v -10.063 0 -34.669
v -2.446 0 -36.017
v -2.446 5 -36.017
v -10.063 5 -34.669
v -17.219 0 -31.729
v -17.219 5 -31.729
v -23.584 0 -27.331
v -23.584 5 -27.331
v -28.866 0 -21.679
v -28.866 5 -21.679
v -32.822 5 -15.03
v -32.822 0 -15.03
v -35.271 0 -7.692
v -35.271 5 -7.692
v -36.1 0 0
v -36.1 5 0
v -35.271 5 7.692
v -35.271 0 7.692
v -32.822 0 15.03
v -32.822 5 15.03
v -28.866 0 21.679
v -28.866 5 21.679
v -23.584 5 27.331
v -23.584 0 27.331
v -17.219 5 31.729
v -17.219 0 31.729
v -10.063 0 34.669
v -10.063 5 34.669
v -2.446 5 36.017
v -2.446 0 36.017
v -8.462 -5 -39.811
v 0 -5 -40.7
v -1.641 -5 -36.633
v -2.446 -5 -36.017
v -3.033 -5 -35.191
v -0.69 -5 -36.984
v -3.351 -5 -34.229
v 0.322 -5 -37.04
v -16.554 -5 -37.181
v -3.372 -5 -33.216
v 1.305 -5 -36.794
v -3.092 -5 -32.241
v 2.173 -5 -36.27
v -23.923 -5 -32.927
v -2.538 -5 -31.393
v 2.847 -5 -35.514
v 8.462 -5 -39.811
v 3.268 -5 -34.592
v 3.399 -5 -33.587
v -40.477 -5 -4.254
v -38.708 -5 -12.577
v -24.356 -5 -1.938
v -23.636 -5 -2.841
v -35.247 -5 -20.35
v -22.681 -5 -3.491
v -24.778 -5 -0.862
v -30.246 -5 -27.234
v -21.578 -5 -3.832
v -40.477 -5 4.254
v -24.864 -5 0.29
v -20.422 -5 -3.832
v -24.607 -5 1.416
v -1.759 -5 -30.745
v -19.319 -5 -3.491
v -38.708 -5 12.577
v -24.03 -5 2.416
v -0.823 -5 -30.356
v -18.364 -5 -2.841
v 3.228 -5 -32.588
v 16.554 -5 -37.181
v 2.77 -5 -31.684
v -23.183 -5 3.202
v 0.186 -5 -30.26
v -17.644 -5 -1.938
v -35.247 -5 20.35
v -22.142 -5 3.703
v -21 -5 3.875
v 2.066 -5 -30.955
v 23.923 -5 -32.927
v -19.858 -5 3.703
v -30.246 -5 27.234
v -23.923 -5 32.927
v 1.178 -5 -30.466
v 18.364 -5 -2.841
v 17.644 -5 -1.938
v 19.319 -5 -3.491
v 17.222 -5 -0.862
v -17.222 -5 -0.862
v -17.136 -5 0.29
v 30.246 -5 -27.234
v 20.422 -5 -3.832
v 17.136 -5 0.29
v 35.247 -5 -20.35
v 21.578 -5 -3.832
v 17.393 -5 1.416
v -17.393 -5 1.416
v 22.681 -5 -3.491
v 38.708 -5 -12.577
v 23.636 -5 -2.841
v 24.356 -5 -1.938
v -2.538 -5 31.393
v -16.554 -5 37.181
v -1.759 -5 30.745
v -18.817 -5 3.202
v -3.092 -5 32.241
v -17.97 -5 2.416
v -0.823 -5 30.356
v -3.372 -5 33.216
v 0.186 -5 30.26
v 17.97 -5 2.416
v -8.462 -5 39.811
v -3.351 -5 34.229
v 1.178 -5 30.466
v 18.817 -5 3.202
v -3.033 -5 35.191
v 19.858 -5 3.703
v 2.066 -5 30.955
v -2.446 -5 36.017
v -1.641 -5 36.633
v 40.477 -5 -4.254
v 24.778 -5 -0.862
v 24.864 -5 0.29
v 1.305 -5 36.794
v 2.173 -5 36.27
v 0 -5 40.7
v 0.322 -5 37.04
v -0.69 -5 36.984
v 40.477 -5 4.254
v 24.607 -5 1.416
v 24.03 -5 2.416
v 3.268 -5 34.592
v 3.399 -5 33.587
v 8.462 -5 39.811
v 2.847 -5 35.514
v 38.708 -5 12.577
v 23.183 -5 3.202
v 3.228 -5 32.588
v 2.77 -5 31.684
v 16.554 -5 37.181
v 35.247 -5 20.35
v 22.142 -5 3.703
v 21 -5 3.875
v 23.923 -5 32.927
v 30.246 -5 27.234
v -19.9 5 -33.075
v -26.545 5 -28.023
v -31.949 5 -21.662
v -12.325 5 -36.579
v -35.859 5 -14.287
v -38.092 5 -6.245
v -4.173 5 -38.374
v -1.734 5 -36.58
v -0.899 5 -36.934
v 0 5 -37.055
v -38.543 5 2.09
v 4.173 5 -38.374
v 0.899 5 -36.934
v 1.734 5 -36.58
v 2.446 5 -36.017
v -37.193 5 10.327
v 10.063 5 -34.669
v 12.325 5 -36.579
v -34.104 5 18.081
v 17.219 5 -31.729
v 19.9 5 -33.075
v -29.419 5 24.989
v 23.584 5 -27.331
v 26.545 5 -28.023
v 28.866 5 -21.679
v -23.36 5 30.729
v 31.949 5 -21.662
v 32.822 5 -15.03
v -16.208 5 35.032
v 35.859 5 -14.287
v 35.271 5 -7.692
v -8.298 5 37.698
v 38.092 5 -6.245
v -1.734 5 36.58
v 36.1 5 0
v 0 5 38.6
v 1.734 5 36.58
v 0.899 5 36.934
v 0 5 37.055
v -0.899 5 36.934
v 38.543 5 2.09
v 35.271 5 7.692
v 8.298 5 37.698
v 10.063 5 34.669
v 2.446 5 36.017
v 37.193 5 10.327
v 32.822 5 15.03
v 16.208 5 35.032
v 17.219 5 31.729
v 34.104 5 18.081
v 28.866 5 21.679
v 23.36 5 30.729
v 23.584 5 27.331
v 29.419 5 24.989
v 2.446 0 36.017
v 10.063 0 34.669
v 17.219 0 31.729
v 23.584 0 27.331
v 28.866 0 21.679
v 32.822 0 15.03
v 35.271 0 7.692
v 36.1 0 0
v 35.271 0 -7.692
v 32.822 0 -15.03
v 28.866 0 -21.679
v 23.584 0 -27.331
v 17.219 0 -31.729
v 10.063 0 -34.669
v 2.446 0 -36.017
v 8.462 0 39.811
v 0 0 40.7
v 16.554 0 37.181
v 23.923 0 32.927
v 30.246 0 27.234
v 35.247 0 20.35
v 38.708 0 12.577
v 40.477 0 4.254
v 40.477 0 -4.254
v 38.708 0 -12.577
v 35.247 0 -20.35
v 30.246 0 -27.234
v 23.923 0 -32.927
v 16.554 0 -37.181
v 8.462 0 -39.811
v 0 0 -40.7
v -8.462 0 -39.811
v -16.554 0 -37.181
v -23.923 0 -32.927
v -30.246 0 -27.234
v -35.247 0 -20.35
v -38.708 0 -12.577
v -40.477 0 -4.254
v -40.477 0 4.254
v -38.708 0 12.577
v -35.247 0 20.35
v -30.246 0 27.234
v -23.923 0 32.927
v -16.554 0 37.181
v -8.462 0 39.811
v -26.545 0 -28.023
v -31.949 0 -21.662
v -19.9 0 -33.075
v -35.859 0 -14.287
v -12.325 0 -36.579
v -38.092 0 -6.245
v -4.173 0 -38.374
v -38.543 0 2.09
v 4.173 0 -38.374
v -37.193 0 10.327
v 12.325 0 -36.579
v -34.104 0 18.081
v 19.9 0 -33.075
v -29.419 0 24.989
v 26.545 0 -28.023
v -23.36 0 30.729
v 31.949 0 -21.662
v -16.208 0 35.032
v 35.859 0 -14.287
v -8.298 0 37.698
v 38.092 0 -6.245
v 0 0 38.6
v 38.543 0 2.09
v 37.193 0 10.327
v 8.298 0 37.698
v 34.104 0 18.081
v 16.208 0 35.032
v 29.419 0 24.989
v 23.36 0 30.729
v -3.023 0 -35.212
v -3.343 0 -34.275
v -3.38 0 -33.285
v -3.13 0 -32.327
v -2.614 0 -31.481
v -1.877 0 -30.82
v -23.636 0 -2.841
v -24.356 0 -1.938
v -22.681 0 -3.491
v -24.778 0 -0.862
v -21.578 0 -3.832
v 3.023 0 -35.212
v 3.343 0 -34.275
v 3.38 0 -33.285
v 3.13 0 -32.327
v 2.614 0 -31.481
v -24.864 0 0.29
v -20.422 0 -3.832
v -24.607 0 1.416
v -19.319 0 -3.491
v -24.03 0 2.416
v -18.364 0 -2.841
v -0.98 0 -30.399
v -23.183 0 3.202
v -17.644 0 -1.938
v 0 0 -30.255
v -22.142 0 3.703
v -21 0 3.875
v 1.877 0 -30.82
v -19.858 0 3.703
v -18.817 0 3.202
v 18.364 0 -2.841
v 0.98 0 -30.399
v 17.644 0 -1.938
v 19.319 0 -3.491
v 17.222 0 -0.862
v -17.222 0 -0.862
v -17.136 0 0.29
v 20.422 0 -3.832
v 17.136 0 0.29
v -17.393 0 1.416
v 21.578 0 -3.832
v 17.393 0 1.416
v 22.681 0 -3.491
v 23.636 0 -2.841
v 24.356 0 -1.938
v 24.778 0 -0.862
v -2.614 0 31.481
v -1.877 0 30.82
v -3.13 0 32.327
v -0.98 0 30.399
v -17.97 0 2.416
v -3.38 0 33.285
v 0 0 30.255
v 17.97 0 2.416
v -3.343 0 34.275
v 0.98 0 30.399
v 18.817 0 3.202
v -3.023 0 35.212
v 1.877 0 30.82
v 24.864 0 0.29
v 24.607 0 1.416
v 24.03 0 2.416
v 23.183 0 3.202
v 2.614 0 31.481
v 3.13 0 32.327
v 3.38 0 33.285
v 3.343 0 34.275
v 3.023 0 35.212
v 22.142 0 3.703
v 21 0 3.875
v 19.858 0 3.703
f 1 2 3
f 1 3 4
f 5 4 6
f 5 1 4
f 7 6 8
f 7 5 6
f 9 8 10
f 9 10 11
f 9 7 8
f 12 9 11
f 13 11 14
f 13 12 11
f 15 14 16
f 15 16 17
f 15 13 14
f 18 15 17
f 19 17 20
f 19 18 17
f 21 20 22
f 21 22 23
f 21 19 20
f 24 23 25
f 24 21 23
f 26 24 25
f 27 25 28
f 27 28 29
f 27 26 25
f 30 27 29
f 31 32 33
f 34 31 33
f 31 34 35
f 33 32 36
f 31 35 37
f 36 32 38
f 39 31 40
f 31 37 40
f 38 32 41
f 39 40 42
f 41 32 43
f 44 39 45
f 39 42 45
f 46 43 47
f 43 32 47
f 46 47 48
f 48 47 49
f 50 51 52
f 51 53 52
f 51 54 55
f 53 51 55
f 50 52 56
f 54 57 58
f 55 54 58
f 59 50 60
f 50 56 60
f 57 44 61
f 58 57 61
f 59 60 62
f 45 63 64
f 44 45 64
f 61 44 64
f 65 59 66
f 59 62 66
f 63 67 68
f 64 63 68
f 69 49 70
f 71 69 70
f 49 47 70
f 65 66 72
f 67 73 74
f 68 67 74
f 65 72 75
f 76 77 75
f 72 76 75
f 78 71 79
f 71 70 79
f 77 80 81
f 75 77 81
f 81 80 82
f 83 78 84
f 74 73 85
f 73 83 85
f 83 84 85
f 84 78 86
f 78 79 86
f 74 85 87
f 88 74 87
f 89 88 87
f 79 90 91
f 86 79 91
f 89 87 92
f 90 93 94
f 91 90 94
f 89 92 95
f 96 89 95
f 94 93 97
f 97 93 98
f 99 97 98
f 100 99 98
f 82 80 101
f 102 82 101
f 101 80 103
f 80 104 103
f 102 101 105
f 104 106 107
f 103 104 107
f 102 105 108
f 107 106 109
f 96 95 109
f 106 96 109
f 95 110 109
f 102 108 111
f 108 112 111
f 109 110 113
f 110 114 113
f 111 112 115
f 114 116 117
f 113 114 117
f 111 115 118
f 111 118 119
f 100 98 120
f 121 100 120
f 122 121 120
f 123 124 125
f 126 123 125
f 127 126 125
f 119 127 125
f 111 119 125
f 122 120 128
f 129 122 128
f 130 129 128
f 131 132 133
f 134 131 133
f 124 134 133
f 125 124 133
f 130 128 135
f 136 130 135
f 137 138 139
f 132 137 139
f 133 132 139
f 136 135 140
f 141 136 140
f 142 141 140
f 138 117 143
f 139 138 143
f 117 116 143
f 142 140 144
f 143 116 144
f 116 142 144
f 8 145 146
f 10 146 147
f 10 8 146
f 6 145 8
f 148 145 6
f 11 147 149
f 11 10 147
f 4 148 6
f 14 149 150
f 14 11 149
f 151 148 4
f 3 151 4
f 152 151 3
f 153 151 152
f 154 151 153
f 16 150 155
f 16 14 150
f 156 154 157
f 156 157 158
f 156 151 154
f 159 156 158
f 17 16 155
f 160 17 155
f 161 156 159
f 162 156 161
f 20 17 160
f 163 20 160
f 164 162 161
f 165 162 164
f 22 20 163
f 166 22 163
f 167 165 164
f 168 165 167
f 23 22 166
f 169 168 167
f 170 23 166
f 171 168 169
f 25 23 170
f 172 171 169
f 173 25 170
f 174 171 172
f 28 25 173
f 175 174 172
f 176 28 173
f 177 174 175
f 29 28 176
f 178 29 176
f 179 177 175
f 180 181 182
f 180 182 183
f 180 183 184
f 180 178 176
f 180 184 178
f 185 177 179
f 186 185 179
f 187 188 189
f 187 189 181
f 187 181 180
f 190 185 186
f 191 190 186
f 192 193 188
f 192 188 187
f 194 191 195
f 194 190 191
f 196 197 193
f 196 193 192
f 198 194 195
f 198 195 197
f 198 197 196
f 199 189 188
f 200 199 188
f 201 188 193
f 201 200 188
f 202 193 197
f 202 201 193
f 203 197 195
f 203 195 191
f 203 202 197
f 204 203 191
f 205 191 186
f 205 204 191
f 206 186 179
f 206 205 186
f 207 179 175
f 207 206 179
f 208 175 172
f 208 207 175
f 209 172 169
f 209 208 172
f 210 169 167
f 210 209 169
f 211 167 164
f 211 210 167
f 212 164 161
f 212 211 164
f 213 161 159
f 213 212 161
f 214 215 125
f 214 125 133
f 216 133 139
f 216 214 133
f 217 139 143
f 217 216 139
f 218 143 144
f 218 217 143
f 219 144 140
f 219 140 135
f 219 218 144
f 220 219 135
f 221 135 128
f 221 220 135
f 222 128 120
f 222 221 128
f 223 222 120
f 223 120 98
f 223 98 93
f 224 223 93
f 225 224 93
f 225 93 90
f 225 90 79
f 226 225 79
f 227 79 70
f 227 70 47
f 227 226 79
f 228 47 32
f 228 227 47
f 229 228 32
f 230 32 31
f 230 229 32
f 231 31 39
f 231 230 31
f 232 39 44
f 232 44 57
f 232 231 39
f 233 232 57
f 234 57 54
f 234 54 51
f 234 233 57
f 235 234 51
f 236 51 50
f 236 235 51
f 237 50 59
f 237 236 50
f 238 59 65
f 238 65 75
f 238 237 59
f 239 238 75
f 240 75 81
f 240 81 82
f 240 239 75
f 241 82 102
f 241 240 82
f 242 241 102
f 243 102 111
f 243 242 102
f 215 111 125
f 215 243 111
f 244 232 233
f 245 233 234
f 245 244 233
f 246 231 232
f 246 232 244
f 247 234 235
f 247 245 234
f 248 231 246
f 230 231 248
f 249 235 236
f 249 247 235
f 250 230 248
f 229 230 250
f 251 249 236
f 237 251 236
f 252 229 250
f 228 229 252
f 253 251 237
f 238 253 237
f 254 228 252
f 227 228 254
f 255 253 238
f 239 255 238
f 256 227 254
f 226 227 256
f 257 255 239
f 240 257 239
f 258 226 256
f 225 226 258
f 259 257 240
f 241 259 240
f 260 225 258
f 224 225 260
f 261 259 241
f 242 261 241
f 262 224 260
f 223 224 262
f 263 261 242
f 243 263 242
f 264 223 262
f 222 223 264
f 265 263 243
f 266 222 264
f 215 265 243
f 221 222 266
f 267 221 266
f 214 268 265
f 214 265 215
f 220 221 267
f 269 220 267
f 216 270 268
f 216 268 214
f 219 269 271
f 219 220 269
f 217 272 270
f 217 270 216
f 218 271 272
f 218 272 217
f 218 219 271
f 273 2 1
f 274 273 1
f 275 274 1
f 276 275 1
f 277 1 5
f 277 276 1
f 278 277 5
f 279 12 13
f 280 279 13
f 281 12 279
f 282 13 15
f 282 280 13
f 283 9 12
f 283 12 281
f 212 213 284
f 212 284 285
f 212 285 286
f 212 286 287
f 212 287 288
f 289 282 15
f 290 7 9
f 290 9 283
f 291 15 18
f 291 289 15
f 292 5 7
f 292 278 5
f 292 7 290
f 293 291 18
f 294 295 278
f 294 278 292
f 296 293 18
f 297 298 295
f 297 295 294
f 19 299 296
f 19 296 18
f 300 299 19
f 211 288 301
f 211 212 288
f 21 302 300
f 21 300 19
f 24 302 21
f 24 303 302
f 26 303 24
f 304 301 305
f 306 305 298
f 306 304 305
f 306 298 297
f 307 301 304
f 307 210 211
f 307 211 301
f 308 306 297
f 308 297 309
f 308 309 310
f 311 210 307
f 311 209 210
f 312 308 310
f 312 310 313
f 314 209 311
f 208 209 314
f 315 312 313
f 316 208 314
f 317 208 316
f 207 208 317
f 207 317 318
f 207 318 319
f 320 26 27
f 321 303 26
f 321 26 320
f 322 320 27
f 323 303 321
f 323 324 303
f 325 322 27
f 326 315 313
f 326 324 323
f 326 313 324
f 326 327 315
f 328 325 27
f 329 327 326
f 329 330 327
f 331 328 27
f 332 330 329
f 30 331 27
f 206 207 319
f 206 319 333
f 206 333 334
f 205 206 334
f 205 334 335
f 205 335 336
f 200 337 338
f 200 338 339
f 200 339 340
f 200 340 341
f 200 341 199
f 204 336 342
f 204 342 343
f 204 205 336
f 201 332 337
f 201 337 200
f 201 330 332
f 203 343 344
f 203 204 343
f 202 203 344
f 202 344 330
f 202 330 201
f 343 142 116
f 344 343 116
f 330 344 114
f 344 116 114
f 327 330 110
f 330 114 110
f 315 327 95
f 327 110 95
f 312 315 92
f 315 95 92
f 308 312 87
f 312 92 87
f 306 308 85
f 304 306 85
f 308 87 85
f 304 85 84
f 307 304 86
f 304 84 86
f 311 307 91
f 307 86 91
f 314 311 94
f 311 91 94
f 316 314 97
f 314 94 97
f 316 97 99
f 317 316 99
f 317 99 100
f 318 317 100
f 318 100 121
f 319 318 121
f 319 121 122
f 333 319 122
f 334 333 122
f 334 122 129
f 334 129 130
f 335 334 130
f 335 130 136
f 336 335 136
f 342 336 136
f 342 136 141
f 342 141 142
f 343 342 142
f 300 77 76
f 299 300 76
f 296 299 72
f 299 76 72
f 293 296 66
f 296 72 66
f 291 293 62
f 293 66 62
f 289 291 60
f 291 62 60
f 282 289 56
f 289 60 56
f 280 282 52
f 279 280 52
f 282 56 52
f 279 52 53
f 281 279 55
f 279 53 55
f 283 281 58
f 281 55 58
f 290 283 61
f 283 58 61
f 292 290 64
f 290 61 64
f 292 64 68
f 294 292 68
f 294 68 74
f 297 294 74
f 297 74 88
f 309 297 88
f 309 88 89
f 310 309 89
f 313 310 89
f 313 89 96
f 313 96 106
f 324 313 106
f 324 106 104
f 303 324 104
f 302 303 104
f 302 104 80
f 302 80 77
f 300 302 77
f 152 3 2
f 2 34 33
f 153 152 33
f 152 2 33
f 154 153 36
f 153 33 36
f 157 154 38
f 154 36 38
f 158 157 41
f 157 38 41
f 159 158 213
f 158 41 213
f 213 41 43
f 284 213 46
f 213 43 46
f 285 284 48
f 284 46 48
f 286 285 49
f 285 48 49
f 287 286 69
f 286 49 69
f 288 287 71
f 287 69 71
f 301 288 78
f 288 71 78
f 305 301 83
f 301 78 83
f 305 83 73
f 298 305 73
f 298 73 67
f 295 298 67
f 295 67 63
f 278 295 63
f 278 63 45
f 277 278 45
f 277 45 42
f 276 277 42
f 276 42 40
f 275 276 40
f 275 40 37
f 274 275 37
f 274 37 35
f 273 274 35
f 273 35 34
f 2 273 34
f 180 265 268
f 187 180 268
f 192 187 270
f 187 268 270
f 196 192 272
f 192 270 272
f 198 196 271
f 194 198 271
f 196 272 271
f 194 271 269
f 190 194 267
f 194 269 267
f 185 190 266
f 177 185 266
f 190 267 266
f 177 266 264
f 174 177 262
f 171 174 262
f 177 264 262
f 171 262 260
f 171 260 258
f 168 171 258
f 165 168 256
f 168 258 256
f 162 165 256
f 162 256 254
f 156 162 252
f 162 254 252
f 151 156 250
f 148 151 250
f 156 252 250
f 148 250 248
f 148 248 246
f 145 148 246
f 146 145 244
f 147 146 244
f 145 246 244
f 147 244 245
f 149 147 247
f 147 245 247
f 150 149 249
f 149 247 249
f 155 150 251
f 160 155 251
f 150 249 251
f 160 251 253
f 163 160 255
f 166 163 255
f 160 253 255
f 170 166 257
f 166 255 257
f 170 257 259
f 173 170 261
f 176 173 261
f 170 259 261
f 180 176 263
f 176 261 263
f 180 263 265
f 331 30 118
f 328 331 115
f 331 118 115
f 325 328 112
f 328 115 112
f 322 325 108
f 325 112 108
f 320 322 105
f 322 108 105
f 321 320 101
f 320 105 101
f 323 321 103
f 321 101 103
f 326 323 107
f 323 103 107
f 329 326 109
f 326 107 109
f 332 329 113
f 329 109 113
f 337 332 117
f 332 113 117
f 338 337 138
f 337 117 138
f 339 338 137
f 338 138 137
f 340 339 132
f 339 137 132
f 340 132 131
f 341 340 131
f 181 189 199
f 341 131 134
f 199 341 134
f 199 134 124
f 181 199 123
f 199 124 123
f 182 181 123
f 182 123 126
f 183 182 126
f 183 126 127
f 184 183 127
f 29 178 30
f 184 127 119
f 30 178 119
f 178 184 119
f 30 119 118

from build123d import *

# Parameters (mm, degrees)
SKETCH1_R               = 38.6
SKETCH1_R_2             = 36.1
BOSS_EXTRUDE1_DEPTH     = 5
SKETCH1_4_R             = 40.7
BOSS_EXTRUDE2_DEPTH     = 5
CUT_EXTRUDE1_DEPTH      = 59.420715504
CUT_EXTRUDE1_DEPTH_BACK = 59.420715504
SKETCH4_R               = 3.875
SKETCH4_R_2             = 3.4


with BuildPart() as part:
    # Sketch1 → Boss-Extrude1 (new body)
    with BuildSketch(Plane(origin=(0, 0, 0), x_dir=(1, 0, 0), z_dir=(0, 1, 0))):
        Circle(SKETCH1_R)
        Circle(SKETCH1_R_2, mode=Mode.SUBTRACT)
    extrude(amount=BOSS_EXTRUDE1_DEPTH)

    # Sketch1<4> → Boss-Extrude2 (add)
    with BuildSketch(Plane(origin=(0, 0, 0), x_dir=(1, 0, 0), z_dir=(0, 1, 0))):
        Circle(SKETCH1_4_R)
    extrude(amount=-BOSS_EXTRUDE2_DEPTH)

    # Sketch4 → Cut-Extrude1 (cut, two sides: drawn at the far end of the back side and taken through both)
    with BuildSketch(Plane.XZ.offset(5).offset(-CUT_EXTRUDE1_DEPTH_BACK)):
        with Locations((-21, 0)):
            Circle(SKETCH4_R)
        with Locations((21, 0)):
            Circle(SKETCH4_R)
        with Locations((0, 33.655)):
            Circle(SKETCH4_R_2)
        with Locations((0, -33.655)):
            Circle(SKETCH4_R_2)
    extrude(amount=CUT_EXTRUDE1_DEPTH + CUT_EXTRUDE1_DEPTH_BACK, mode=Mode.SUBTRACT)


solid = part.part
